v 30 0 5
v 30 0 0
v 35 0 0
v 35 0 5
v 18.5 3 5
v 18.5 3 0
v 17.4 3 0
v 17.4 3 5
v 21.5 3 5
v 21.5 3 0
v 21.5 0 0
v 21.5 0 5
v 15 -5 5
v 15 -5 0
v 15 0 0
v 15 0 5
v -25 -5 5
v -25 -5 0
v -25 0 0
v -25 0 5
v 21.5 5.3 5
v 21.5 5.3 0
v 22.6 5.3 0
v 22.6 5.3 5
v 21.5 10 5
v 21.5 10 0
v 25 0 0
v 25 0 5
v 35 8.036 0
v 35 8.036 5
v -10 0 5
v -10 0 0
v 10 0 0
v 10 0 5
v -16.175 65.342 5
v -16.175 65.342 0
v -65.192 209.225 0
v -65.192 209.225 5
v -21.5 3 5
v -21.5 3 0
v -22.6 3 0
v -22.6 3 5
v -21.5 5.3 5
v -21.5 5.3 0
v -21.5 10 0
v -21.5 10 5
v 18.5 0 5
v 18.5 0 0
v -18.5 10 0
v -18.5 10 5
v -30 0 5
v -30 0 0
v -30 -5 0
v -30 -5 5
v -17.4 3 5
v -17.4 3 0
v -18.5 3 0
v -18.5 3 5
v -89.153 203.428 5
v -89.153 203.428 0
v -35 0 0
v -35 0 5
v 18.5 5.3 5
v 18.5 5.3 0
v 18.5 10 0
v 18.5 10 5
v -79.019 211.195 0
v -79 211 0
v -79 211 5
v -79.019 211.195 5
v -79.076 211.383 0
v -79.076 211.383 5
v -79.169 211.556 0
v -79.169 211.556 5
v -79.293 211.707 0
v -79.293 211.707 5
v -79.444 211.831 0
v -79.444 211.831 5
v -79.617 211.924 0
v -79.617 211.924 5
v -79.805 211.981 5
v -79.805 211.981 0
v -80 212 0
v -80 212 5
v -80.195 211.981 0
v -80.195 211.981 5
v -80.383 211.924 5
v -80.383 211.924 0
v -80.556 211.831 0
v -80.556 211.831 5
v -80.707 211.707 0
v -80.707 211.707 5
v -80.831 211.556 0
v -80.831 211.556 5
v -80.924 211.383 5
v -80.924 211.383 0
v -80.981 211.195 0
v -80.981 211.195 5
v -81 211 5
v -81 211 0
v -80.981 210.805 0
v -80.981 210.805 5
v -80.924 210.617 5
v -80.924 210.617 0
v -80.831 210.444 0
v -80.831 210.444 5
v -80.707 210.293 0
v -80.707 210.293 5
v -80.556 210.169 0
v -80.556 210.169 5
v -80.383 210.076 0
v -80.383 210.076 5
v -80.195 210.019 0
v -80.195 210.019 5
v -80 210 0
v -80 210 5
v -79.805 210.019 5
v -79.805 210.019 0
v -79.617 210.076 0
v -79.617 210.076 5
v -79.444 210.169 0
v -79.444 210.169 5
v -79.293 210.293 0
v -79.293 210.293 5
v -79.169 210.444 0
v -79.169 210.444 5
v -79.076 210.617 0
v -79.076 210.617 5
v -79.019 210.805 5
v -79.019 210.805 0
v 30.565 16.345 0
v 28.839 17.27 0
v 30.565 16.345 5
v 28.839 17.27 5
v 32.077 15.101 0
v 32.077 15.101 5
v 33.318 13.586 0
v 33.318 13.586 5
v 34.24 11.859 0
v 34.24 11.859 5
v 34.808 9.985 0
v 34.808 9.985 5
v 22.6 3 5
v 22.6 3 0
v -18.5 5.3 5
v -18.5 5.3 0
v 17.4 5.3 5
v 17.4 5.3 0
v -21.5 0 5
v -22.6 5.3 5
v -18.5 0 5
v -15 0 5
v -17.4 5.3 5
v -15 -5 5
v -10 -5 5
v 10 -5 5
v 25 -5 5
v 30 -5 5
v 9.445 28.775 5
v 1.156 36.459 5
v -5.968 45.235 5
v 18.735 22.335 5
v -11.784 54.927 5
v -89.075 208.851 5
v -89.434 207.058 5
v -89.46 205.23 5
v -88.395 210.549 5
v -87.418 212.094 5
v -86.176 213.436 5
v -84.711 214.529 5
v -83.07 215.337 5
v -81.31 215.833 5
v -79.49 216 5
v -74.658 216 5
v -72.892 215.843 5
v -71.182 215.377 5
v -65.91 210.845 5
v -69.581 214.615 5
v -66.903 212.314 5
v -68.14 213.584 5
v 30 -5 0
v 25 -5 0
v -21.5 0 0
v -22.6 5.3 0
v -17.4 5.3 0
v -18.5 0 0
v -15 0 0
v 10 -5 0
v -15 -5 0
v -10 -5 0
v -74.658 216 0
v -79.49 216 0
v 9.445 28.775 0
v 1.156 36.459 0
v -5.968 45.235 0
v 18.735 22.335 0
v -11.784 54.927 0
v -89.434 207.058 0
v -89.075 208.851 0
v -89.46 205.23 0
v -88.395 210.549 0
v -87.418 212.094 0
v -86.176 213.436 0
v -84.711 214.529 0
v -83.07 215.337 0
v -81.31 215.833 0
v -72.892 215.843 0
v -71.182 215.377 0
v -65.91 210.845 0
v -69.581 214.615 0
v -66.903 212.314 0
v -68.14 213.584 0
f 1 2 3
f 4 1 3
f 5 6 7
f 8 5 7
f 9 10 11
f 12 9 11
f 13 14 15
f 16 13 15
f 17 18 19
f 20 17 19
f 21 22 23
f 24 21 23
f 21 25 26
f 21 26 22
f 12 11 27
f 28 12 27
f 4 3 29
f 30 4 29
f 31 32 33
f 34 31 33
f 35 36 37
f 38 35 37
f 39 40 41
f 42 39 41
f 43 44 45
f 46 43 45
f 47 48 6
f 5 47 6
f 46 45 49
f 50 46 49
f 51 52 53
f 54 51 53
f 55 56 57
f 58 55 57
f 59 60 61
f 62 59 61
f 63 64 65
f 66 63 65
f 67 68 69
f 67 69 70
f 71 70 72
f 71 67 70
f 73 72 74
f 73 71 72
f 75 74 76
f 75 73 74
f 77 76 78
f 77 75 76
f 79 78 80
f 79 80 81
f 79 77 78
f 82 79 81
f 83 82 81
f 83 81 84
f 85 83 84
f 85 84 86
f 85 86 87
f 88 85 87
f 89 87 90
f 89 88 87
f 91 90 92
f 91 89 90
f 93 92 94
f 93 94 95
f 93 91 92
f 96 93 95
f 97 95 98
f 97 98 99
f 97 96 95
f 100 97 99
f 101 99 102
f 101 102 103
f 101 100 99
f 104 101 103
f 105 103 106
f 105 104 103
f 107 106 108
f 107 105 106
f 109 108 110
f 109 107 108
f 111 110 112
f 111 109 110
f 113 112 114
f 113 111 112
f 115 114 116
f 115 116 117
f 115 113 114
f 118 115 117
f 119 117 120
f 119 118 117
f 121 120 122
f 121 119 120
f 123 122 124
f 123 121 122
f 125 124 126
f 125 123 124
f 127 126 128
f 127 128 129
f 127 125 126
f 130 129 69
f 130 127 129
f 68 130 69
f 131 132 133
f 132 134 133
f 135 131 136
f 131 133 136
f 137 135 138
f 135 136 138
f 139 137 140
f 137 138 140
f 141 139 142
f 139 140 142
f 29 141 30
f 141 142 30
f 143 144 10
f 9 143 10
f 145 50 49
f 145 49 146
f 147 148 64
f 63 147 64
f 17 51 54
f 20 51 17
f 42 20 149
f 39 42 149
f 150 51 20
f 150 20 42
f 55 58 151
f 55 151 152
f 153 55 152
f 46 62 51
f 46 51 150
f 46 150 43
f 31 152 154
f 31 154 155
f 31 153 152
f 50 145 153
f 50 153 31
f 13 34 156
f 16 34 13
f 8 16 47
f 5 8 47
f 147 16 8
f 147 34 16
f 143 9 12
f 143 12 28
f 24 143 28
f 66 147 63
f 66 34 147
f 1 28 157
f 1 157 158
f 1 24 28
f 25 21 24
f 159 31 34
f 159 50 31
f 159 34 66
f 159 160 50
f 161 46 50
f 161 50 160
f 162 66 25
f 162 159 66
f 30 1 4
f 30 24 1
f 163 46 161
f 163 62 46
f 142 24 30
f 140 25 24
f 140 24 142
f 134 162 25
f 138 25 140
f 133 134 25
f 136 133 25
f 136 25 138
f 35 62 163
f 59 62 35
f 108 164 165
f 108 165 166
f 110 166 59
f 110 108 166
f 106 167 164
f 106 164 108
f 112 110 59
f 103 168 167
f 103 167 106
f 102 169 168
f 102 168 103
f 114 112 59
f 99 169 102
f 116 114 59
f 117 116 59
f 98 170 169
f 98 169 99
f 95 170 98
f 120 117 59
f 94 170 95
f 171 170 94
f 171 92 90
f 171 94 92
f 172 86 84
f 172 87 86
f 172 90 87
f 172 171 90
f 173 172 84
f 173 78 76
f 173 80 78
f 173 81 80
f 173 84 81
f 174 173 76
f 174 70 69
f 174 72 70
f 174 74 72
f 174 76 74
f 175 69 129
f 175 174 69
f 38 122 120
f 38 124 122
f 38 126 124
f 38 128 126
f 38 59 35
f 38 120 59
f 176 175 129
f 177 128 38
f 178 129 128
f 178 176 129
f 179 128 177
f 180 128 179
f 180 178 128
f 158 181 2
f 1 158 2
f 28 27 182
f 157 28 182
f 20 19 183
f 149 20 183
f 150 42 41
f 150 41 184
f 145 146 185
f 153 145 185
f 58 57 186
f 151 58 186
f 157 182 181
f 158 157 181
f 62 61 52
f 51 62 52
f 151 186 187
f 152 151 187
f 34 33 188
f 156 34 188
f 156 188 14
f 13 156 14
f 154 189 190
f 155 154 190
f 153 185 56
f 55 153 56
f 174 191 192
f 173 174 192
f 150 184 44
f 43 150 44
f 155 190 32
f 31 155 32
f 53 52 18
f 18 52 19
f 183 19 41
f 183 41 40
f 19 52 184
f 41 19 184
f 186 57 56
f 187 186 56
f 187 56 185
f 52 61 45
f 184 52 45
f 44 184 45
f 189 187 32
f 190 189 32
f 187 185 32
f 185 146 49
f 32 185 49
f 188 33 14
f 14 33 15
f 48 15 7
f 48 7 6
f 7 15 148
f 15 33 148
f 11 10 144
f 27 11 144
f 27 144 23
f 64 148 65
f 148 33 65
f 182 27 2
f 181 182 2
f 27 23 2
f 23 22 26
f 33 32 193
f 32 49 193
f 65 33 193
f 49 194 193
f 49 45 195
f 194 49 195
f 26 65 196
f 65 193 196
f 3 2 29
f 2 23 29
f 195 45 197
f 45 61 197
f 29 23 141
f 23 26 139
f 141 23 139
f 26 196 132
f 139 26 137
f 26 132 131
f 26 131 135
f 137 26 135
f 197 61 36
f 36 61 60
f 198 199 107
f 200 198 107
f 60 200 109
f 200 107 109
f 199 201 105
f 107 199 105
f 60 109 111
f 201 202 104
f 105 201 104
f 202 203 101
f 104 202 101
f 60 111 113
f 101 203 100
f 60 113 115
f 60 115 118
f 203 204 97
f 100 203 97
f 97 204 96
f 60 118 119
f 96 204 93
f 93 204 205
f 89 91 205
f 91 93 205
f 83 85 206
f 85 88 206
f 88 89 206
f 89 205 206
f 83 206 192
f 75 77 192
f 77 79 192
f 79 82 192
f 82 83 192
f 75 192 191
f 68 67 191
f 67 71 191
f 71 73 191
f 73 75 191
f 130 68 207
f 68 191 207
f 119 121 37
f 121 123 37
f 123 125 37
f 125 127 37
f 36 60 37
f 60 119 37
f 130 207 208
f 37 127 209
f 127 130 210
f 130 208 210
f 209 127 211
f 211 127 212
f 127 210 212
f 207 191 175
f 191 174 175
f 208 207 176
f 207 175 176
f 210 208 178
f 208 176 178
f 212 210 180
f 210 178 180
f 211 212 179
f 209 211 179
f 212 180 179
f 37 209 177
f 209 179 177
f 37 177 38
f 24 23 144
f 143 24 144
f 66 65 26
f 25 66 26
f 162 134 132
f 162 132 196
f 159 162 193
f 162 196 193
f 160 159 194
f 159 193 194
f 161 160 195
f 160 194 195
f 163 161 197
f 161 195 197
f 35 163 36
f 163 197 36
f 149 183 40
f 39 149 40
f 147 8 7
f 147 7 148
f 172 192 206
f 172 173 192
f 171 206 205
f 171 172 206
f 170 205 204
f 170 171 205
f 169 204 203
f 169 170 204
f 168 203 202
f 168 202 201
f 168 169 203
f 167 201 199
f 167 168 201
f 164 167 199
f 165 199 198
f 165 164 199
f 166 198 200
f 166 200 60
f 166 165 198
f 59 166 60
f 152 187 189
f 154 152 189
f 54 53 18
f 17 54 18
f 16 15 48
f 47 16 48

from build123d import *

# Parameters (mm, degrees)
BOSS_EXTRU_1_OUTLINE_R = 1
BOSS_EXTRU_1_DEPTH     = 5
CONG_1_R               = 10


# Read off the part's stored shape, not the designer's step: Boss.-Extru.1
with BuildPart() as part:
    # Boss.-Extru.1 outline → Boss.-Extru.1 (new body)
    with BuildSketch(Plane.XY):
        with BuildLine():
            Line((-67.5, 216), (-92.5, 216))
            Line((-92.5, 216), (-35, 0))
            Line((-35, 0), (-30, 0))
            Line((-30, 0), (-30, -5))
            Line((-30, -5), (-25, -5))
            Line((-25, -5), (-25, 0))
            Line((-25, 0), (-21.5, 0))
            Line((-21.5, 0), (-21.5, 3))
            Line((-21.5, 3), (-22.6, 3))
            Line((-22.6, 3), (-22.6, 5.3))
            Line((-22.6, 5.3), (-21.5, 5.3))
            Line((-21.5, 5.3), (-21.5, 10))
            Line((-21.5, 10), (-18.5, 10))
            Line((-18.5, 10), (-18.5, 5.3))
            Line((-18.5, 5.3), (-17.4, 5.3))
            Line((-17.4, 5.3), (-17.4, 3))
            Line((-17.4, 3), (-18.5, 3))
            Line((-18.5, 3), (-18.5, 0))
            Line((-18.5, 0), (-15, 0))
            Line((-15, 0), (-15, -5))
            Line((-15, -5), (-10, -5))
            Line((-10, -5), (-10, 0))
            Line((-10, 0), (10, 0))
            Line((10, 0), (10, -5))
            Line((10, -5), (15, -5))
            Line((15, -5), (15, 0))
            Line((15, 0), (18.5, 0))
            Line((18.5, 0), (18.5, 3))
            Line((18.5, 3), (17.4, 3))
            Line((17.4, 3), (17.4, 5.3))
            Line((17.4, 5.3), (18.5, 5.3))
            Line((18.5, 5.3), (18.5, 10))
            Line((18.5, 10), (21.5, 10))
            Line((21.5, 10), (21.5, 5.3))
            Line((21.5, 5.3), (22.6, 5.3))
            Line((22.6, 5.3), (22.6, 3))
            Line((22.6, 3), (21.5, 3))
            Line((21.5, 3), (21.5, 0))
            Line((21.5, 0), (25, 0))
            Line((25, 0), (25, -5))
            Line((25, -5), (30, -5))
            Line((30, -5), (30, 0))
            Line((30, 0), (35, 0))
            Line((35, 0), (35, 15))
            ThreePointArc((35, 15), (3.448702598, 34.108667771), (-16.175379452, 65.341998613))
            Line((-16.175379452, 65.341998613), (-67.5, 216))
        make_face()
        with Locations((-80, 211)):
            Circle(BOSS_EXTRU_1_OUTLINE_R, mode=Mode.SUBTRACT)
    extrude(amount=BOSS_EXTRU_1_DEPTH)

    # Congé1
    cong_1_edges = [part.edges().sort_by_distance(p)[0] for p in [
        (-67.5, 216, 2.5),
        (35, 15, 2.5),
        (-92.5, 216, 2.5),
    ]]
    fillet(cong_1_edges, radius=CONG_1_R)


solid = part.part
